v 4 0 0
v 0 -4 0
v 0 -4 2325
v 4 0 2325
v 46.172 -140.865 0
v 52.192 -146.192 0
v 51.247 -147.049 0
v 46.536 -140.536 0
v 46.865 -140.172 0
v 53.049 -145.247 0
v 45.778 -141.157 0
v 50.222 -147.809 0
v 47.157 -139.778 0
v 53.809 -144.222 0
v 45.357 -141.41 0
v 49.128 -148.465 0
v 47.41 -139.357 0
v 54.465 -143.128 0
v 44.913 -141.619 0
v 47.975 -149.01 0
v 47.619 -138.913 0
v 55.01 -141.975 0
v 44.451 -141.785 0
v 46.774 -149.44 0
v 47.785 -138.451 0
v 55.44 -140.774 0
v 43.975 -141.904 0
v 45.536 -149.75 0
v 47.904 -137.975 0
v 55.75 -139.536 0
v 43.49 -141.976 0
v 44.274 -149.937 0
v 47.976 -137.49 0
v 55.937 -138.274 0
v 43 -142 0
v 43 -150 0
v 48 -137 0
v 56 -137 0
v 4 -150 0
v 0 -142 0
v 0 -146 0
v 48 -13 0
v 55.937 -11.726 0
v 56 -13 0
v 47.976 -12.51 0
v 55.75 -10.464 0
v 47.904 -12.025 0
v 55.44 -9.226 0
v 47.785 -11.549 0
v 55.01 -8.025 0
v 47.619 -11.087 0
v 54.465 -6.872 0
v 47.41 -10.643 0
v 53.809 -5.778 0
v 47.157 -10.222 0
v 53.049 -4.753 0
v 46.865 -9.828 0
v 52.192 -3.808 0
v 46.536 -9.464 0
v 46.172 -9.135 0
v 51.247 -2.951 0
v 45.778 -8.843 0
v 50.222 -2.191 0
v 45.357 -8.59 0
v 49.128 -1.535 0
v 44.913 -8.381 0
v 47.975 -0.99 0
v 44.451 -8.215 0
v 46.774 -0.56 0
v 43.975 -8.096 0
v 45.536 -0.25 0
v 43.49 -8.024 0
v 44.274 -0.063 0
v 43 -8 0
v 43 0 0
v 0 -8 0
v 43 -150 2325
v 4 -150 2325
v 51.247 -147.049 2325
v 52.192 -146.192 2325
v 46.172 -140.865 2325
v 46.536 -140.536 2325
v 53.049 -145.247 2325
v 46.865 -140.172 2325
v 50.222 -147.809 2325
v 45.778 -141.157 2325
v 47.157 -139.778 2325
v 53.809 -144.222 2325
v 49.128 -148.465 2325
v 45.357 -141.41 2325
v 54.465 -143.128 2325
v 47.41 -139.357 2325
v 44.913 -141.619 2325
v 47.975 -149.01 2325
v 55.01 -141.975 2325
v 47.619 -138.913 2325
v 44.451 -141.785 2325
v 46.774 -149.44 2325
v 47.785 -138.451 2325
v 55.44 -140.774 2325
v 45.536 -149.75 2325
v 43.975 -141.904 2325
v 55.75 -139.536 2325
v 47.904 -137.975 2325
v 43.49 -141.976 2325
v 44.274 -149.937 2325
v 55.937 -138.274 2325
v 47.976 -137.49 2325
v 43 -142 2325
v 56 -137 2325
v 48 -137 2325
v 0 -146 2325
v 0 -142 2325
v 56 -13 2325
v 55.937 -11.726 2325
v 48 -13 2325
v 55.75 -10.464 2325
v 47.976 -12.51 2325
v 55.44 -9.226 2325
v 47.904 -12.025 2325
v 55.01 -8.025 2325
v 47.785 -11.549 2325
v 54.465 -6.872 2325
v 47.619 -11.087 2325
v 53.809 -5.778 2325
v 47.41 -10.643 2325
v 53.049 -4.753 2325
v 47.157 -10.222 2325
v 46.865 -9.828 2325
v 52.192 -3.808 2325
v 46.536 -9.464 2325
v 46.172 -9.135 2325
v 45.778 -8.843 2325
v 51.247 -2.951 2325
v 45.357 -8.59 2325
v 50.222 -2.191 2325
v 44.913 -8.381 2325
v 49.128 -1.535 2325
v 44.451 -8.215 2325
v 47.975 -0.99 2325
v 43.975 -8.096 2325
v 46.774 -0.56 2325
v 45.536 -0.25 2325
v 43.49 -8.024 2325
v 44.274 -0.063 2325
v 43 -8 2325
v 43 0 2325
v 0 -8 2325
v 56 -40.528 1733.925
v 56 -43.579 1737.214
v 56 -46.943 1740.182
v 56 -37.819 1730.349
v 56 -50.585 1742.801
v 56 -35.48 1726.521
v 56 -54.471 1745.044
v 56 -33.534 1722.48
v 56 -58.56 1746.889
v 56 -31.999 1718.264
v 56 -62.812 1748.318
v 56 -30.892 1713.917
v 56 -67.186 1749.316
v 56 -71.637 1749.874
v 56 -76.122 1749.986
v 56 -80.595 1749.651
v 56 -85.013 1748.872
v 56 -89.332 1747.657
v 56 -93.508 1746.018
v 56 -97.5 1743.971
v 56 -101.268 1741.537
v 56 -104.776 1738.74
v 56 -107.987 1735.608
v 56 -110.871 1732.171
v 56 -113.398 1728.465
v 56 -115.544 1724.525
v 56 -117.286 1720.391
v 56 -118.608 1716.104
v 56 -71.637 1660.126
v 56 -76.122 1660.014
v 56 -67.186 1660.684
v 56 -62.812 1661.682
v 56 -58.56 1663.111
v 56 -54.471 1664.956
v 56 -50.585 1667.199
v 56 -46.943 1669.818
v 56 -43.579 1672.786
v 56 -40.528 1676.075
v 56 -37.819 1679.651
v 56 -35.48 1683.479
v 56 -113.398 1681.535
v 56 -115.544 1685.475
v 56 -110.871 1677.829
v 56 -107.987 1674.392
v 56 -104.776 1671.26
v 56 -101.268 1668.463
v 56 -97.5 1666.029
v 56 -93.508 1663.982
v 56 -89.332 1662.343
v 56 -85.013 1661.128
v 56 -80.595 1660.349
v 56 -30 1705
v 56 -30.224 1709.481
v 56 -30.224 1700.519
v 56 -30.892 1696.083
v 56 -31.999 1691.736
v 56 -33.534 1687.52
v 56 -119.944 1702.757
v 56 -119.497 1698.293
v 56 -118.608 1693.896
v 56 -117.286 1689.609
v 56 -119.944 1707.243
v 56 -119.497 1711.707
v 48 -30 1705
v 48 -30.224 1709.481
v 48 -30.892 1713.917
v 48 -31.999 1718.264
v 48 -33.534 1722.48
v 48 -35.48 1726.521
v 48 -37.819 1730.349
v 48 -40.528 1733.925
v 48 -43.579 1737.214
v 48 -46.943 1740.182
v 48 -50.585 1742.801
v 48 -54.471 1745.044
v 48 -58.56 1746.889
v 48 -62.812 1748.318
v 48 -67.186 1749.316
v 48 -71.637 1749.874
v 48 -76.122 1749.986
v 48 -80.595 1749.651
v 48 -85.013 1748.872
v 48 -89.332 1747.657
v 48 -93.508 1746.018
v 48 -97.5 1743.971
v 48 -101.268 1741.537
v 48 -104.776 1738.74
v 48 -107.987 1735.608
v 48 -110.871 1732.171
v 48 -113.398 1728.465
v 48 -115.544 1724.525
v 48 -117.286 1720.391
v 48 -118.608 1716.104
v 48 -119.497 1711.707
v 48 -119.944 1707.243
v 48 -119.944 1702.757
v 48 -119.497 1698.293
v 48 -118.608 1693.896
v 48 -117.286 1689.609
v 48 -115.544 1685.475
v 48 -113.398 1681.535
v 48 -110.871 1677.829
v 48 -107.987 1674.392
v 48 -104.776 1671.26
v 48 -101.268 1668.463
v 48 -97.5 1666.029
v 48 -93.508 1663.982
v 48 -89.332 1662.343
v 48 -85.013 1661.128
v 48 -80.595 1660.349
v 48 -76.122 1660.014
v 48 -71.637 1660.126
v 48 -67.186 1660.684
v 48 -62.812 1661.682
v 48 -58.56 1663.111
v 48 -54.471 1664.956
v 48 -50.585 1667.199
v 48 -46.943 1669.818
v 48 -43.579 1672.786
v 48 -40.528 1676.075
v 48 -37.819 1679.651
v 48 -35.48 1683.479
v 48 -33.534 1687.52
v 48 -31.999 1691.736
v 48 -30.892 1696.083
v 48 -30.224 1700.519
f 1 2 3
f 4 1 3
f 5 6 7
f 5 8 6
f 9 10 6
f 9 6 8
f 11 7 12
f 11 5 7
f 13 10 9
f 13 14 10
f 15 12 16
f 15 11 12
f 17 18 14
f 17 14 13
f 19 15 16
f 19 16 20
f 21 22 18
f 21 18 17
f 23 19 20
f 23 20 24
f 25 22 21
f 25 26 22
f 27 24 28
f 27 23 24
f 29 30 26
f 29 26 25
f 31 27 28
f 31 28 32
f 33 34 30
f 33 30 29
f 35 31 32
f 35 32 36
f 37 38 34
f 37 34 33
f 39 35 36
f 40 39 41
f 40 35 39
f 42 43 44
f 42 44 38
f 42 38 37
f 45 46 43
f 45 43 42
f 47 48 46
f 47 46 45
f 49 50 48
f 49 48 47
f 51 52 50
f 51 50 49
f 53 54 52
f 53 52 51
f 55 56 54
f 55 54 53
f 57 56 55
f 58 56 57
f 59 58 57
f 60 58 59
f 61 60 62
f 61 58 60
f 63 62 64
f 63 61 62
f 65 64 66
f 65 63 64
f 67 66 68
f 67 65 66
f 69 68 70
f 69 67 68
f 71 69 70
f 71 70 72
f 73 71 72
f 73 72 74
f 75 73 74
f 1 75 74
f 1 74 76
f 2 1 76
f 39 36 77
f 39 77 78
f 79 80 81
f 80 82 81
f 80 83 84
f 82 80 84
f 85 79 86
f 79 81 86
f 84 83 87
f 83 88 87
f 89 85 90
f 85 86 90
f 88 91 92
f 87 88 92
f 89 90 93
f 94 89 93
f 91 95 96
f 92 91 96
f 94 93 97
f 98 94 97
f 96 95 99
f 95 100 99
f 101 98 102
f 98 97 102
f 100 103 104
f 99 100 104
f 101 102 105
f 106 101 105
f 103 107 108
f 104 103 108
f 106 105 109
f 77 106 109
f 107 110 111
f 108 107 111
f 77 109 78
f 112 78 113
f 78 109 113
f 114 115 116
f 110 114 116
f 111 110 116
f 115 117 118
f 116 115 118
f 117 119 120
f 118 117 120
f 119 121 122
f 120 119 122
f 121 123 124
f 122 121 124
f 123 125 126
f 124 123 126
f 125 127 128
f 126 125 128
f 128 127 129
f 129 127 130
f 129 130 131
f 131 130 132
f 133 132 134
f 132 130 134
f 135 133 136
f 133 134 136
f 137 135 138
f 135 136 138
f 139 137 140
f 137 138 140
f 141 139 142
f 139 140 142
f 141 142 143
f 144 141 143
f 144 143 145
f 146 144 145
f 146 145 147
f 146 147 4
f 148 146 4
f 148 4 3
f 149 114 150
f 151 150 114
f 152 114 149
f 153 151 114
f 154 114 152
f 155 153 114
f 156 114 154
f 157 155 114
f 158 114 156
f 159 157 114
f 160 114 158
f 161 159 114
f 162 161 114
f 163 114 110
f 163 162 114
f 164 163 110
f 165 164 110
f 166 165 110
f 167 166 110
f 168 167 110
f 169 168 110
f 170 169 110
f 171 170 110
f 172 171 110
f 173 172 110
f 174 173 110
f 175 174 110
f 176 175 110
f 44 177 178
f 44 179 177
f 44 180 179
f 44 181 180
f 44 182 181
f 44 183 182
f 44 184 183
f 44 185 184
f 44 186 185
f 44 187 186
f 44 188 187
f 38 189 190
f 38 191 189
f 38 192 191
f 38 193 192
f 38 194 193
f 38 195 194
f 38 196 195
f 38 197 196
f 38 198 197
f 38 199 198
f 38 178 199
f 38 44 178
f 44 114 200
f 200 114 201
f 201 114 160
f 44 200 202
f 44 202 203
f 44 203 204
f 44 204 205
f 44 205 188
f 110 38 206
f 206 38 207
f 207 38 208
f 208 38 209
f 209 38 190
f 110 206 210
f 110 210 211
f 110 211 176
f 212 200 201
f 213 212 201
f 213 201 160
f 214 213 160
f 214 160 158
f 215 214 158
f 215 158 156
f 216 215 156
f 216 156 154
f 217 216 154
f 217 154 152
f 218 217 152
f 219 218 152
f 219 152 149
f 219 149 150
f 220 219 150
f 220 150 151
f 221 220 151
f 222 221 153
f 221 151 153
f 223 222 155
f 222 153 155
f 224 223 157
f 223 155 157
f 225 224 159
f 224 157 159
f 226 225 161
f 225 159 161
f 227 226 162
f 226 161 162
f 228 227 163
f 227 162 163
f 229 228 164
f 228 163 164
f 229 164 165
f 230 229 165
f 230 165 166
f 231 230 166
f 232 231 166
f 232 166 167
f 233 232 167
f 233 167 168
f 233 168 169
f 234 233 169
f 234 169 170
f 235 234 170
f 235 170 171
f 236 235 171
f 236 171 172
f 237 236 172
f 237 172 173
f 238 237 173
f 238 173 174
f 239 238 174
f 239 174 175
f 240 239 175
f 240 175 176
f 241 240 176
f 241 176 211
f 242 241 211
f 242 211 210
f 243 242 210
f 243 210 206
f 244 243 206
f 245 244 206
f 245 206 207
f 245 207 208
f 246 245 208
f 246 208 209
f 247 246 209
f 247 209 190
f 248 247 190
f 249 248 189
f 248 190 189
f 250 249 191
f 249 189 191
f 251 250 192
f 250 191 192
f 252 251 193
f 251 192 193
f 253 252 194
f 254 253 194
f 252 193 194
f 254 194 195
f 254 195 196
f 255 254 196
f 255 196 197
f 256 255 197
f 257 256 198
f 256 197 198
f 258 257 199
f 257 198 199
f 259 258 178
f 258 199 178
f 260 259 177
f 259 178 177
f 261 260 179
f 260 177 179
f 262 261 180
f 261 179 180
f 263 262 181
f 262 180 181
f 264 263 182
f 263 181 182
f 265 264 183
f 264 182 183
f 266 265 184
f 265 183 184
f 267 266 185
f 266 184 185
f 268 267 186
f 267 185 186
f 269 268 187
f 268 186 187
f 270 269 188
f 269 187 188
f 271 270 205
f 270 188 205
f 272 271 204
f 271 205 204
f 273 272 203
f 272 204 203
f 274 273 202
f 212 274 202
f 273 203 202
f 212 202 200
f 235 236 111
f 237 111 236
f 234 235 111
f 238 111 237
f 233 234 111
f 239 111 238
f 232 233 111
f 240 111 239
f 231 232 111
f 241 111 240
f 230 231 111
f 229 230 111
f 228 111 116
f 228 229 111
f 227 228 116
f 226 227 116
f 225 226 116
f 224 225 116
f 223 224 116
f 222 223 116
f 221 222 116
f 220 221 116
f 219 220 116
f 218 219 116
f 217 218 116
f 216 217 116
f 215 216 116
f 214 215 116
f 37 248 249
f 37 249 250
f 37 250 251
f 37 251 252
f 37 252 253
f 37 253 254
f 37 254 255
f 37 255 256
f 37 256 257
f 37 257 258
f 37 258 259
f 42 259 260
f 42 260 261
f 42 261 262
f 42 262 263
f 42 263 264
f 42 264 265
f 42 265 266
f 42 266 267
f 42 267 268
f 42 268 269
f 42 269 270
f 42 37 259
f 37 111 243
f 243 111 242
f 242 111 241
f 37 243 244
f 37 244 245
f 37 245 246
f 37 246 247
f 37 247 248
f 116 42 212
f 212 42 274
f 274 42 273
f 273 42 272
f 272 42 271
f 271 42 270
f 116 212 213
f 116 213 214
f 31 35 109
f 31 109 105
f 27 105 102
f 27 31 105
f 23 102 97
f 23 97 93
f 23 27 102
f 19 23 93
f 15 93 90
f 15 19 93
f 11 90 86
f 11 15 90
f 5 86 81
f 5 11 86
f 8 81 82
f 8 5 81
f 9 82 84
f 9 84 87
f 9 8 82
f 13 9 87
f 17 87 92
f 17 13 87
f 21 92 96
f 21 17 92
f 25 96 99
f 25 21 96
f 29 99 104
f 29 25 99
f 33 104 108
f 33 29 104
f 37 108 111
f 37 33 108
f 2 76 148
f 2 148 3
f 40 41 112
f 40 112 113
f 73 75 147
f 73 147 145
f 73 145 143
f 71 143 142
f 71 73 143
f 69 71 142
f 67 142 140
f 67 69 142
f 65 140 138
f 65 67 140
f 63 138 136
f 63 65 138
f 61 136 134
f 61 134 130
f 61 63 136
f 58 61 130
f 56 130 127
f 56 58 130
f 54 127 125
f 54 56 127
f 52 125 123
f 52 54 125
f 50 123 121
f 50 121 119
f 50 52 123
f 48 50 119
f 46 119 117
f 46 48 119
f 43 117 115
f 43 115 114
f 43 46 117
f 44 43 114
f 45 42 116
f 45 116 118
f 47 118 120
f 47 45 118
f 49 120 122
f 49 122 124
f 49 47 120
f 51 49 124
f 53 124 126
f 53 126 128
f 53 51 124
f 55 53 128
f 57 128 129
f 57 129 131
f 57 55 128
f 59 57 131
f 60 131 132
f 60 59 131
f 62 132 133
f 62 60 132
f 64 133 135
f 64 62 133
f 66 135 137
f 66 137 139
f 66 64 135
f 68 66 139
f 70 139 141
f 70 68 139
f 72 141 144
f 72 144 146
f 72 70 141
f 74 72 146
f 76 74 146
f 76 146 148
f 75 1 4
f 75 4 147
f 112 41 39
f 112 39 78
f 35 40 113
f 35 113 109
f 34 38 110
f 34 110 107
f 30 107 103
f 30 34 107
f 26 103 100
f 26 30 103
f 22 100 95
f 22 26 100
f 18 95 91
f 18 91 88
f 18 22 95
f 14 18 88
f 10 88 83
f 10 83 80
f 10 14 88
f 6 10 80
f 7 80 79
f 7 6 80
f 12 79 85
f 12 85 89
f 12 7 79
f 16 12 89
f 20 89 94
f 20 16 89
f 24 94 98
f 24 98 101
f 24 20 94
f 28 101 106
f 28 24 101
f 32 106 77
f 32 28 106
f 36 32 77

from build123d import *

# Parameters (mm, degrees)
SM_BASE_FLANGE_1_DEPTH = 2325
SKETCH_6_R             = 45
CUT_EXTRUDE_1_DEPTH    = 10
CHAMFER_2_SIZE         = 4


# Sheet-metal steps are written as plain solids
with BuildPart() as part:
    # Sketch 1 → 基体-法兰1 (new body)
    with BuildSketch(Plane.XY):
        with BuildLine():
            Line((0, 0), (43, 0))
            ThreePointArc((43, 0), (52.192388155, -3.807611845), (56, -13))
            Line((56, -13), (56, -137))
            ThreePointArc((56, -137), (52.192388155, -146.192388155), (43, -150))
            Line((43, -150), (0, -150))
            Line((0, -150), (0, -142))
            Line((0, -142), (43, -142))
            ThreePointArc((43, -142), (46.535533906, -140.535533906), (48, -137))
            Line((48, -137), (48, -13))
            ThreePointArc((48, -13), (46.535533906, -9.464466094), (43, -8))
            Line((43, -8), (0, -8))
            Line((0, -8), (0, 0))
        make_face()
    extrude(amount=SM_BASE_FLANGE_1_DEPTH)

    # 草图6 → 切除-拉伸1 (cut)
    with BuildSketch(Plane(origin=(56, 0, 0), x_dir=(0, 0, -1), z_dir=(1, 0, 0))):
        with Locations(Location((-1705, -75, 0), (0, 0, 90))):
            Circle(SKETCH_6_R)
    extrude(amount=-CUT_EXTRUDE_1_DEPTH, mode=Mode.SUBTRACT)

    # 倒角2
    chamfer_2_edges = [part.edges().sort_by_distance(p)[0] for p in [
        (0, 0, 1162.5),
        (0, -150, 1162.5),
    ]]
    chamfer(chamfer_2_edges, length=CHAMFER_2_SIZE)


solid = part.part
